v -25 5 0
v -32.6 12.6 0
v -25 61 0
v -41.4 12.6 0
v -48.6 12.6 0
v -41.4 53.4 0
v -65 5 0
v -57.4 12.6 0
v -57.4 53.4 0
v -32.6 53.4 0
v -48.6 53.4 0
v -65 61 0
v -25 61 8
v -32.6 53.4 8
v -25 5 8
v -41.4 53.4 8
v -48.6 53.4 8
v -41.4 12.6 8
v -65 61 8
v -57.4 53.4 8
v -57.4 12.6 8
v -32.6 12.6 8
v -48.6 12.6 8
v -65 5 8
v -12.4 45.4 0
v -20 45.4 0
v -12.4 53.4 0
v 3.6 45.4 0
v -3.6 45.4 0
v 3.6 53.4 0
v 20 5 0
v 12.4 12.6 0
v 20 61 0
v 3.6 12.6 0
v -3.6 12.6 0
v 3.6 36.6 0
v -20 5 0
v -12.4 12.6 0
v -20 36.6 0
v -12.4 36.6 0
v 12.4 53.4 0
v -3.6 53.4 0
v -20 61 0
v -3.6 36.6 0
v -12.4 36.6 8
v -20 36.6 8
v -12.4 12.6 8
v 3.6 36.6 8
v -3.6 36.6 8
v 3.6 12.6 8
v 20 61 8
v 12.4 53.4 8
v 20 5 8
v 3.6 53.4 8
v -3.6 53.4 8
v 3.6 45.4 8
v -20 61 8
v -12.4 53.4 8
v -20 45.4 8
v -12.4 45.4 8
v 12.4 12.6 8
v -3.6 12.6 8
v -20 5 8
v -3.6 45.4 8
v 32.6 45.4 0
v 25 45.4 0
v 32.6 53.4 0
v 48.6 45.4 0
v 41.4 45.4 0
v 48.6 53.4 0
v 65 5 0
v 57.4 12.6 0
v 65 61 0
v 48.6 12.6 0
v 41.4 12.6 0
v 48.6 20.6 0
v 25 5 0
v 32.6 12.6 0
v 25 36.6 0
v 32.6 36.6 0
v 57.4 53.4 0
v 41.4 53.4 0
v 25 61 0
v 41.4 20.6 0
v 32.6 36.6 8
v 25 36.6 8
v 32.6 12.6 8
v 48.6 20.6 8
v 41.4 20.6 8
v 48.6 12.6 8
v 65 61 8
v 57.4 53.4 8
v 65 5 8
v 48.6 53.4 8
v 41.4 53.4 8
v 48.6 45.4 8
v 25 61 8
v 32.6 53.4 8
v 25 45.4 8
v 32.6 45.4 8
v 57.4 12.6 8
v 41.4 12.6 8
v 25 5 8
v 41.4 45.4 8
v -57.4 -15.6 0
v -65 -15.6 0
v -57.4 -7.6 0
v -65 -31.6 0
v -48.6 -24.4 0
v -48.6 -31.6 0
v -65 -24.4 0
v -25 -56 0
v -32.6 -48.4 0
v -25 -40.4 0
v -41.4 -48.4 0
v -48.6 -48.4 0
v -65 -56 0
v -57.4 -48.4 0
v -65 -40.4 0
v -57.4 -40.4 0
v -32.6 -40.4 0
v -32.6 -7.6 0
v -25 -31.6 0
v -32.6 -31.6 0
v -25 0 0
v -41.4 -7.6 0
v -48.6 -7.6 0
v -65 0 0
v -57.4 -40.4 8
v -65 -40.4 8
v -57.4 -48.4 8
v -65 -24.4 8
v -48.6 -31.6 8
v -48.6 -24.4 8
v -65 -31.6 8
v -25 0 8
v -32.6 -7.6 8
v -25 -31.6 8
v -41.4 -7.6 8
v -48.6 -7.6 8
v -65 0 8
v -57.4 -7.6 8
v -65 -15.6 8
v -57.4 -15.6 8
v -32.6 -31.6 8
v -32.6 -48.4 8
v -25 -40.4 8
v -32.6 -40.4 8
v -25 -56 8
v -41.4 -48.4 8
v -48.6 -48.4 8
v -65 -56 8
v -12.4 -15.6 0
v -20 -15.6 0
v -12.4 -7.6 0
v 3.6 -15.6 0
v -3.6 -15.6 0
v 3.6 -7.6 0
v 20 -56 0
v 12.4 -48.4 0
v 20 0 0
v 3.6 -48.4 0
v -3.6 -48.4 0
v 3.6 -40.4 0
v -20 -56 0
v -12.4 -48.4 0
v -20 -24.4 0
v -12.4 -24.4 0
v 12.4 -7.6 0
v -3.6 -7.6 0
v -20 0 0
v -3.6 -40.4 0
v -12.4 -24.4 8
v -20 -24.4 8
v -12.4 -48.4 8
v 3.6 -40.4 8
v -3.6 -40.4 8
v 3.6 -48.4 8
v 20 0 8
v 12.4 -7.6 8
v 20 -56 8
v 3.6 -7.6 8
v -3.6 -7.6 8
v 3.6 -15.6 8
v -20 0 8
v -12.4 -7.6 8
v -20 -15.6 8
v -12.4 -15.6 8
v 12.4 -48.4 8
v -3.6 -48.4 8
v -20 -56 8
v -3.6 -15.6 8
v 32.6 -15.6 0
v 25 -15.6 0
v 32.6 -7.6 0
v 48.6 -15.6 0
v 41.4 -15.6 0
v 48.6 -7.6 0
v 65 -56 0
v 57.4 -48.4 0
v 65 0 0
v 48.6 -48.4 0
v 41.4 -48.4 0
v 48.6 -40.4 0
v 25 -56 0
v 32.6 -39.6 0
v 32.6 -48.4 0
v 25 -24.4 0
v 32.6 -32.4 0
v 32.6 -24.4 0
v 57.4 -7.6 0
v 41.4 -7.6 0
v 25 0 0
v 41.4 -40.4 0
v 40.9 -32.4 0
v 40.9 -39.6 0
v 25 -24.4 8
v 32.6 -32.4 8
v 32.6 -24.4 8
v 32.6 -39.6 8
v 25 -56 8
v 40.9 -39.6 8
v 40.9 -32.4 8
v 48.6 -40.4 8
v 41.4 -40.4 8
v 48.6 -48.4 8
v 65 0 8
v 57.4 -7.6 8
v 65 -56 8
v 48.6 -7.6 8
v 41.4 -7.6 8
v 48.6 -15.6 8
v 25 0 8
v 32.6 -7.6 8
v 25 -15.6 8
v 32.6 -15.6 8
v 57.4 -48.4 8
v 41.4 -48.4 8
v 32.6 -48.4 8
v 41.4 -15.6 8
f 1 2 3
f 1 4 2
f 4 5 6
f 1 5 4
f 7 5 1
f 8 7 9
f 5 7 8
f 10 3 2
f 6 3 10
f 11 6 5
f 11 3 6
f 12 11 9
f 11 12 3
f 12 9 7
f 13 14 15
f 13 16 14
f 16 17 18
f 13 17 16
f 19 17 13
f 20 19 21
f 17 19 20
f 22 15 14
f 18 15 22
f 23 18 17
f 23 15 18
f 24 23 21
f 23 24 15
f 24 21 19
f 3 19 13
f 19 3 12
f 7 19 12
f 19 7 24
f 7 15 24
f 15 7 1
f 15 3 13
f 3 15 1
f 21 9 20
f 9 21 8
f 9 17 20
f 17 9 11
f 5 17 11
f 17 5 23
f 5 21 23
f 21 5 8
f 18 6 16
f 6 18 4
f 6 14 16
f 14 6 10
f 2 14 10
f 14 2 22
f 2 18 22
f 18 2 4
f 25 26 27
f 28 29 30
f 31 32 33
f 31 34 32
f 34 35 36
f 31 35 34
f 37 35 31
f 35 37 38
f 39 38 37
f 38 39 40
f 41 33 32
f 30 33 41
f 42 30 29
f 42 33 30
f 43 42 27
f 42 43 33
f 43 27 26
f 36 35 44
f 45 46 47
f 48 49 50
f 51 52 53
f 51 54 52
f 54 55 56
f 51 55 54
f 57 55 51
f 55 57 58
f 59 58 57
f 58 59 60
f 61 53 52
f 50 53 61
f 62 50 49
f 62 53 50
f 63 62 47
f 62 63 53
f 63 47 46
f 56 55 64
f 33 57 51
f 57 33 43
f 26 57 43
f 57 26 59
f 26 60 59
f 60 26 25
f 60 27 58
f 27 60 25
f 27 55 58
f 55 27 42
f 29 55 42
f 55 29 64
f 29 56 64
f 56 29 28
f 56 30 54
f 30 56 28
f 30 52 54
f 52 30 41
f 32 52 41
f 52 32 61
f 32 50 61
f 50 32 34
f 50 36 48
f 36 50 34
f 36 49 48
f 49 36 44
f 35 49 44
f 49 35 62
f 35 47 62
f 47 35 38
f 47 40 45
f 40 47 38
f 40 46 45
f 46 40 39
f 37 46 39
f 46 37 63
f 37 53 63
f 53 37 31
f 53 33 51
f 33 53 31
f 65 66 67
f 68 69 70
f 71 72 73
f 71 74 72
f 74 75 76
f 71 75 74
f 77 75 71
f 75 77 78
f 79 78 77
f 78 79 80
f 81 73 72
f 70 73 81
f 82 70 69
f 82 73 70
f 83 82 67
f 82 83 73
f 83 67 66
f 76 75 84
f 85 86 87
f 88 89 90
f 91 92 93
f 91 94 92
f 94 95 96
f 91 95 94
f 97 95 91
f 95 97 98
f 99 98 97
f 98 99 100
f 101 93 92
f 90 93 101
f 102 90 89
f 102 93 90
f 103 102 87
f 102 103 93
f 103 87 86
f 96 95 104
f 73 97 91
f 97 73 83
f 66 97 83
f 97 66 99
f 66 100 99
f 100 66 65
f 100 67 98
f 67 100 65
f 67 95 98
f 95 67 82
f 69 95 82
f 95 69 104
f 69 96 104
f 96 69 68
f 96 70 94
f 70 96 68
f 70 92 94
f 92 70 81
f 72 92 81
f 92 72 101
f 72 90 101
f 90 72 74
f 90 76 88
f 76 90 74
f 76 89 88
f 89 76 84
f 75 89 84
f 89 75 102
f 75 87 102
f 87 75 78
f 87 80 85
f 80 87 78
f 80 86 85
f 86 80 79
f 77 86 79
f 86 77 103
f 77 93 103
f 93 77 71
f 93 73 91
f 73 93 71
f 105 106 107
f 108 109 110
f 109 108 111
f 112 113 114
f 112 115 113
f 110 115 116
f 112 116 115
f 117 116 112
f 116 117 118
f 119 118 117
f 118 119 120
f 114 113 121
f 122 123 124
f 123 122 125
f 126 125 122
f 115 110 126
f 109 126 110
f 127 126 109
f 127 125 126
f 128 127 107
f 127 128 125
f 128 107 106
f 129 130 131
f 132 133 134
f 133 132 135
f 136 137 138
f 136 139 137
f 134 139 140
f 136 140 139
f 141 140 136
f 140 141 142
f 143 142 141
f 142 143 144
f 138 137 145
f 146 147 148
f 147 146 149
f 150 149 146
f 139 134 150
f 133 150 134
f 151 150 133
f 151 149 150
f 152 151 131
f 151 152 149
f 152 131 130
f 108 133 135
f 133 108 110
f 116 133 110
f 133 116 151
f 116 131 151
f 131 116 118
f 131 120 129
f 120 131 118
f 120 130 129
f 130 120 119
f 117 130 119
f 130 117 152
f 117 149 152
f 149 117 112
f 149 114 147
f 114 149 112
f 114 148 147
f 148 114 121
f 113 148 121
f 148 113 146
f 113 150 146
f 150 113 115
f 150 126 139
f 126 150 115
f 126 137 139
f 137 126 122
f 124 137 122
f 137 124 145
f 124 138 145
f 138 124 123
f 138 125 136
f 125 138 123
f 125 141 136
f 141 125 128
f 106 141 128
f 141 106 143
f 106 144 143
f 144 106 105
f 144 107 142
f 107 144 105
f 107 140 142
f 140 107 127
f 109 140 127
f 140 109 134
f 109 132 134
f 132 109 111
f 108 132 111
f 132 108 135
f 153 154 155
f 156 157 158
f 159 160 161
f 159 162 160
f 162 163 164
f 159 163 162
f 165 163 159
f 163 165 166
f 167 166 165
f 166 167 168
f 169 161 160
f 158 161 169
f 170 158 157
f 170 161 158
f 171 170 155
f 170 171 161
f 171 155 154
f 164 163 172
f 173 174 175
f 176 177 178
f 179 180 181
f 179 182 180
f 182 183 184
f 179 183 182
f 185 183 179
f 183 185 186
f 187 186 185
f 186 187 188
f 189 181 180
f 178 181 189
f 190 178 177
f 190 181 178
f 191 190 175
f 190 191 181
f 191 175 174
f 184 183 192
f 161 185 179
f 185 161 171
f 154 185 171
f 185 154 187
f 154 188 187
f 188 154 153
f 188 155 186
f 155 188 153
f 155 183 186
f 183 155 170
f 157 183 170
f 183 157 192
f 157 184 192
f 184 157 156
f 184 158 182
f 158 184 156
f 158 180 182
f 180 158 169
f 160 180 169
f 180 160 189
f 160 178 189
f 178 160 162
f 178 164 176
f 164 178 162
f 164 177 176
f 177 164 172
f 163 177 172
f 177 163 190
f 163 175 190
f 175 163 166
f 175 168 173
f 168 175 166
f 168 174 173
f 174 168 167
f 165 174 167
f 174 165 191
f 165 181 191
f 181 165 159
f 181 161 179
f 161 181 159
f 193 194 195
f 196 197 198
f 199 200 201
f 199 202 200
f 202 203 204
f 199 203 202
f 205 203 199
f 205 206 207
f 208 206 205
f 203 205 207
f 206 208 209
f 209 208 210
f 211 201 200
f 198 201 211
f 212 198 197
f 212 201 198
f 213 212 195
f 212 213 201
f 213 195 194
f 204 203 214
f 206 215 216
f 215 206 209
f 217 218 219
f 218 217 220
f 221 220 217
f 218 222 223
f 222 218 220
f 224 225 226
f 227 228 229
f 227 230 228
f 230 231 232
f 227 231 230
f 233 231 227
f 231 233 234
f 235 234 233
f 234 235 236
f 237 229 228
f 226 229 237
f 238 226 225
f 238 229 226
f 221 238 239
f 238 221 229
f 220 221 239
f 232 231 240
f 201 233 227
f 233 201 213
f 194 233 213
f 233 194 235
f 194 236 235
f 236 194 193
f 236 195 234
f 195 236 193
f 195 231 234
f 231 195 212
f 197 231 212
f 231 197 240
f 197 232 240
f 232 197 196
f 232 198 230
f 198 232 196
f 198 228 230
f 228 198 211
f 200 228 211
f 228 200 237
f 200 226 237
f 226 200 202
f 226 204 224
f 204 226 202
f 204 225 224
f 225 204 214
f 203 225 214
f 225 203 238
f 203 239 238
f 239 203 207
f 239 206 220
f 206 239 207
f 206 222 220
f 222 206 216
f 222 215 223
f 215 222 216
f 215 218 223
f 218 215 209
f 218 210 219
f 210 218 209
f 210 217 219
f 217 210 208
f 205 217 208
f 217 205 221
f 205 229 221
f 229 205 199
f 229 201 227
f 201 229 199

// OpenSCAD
// "Gordian Knot" 3D puzzle.
// Len Trigg <lenbok@gmail.com>
// Modelled off the designs at: http://www.cs.tau.ac.il/~efif/applications/puzzles/knot/
// If you get stuck, see the animation at: http://www.youtube.com/watch?v=xNtNQRTdxps

// Size of one "unit" in mm.
basewidth = 8;  // [5:20]
// Tolerance between parts, in tenths of a mm.
tolerance = 4; // [0:40]

width=basewidth*5;
height=basewidth*7;
tolerance1 = tolerance/10;
tolerance2 = tolerance1*2;
echo("Each piece is ",width," by ",height);

module green2d() {
    difference() {
        square([width, height]);
        translate([basewidth-tolerance1, basewidth-tolerance1]) square([basewidth+tolerance2, basewidth*5+tolerance2]);
        translate([basewidth*3-tolerance1, basewidth-tolerance1]) square([basewidth+tolerance2, basewidth*5+tolerance2]);
    }
}
module yellow2d() {
    difference() {
        square([width, height]);
        translate([basewidth-tolerance1, basewidth-tolerance1]) square([basewidth+tolerance2, basewidth*5+tolerance2]);
        translate([basewidth*3-tolerance1, basewidth-tolerance1]) square([basewidth+tolerance2, basewidth*5+tolerance2]);
        translate([-0.1, basewidth*4-tolerance1]) square([basewidth*3+0.2, basewidth+tolerance2]);
    }
}
module opiece2d() {
    difference() {
        square([width, height]);
        translate([basewidth-tolerance1, basewidth-tolerance1]) square([basewidth+tolerance2, basewidth*5+tolerance2]);
        translate([basewidth*3-tolerance1, basewidth-tolerance1]) square([basewidth+tolerance2, basewidth*5+tolerance2]);
        translate([basewidth*2-0.1, basewidth*2-tolerance1]) square([basewidth+0.2, basewidth*3+tolerance2]);
        translate([-0.1, basewidth*4-tolerance1]) square([basewidth*3+0.2, basewidth+tolerance2]);
    }
}
module red2d() {
    difference() {
        square([width, height]);
        translate([basewidth-tolerance1, basewidth-tolerance1]) square([basewidth+tolerance2, basewidth*2+tolerance2]);
        translate([basewidth-tolerance1, basewidth*4-tolerance1]) square([basewidth+tolerance2, basewidth*2+tolerance2]);
        translate([basewidth*3-tolerance1, basewidth-tolerance1]) square([basewidth+tolerance2, basewidth*5+tolerance2]);
        translate([-0.1, basewidth*4-tolerance1]) square([basewidth+0.2, basewidth+tolerance2]);
        translate([-0.1, basewidth*2-tolerance1]) square([basewidth+0.2, basewidth+tolerance2]);
        translate([basewidth*3, basewidth*2-tolerance1]) square([basewidth*2+0.2, basewidth+tolerance2]);
    }
}
module blue2d() {
    difference() {
        square([width, height]);
        translate([basewidth-tolerance1, basewidth-tolerance1]) square([basewidth+tolerance2, basewidth+tolerance2]);
        translate([basewidth-tolerance1, basewidth*3-tolerance1]) square([basewidth+tolerance2, basewidth*3+tolerance2]);
        translate([basewidth*3-tolerance1, basewidth-tolerance1]) square([basewidth+tolerance2, basewidth*5+tolerance2]);
        translate([basewidth*2-0.1, basewidth*2-tolerance1]) square([basewidth+0.2, basewidth*3+tolerance2]);
        translate([-0.1, basewidth*4-tolerance1]) square([basewidth*3+0.2, basewidth+tolerance2]);
    }
}

module green() {
    color([0,1,0]) linear_extrude(height=basewidth) green2d();
}
module yellow() {
    color([1,1,0]) linear_extrude(height=basewidth) yellow2d();
}
module orange() {
    color([1,0.5,0]) linear_extrude(height=basewidth) opiece2d();
}
module purple() {
    color([1,0,1]) linear_extrude(height=basewidth) opiece2d();
}
module red() {
    color([1,0,0]) linear_extrude(height=basewidth) red2d();
}
module blue() {
    color([0,0,1]) linear_extrude(height=basewidth) blue2d();
}

module printall() {
    translate([-width*3/2-5, 5, 0]) green();
    translate([-width*1/2, 5, 0]) yellow();
    translate([width*1/2+5, 5, 0]) orange();
    translate([-width*3/2-5, -height, 0]) red();
    translate([-width*1/2, -height, 0]) purple();
    translate([width*1/2+5, -height, 0]) blue();
}

// Roughly how it should look when assembled, but the pieces may be in different orientations
module assembled() {
    translate([0, 0, basewidth*2]) {
        translate([0, 0, 0]) red();
        translate([0, 0, basewidth*2]) yellow();
    }
    translate([basewidth*1,basewidth,0]) rotate([90,0,90]) {
        translate([0, 0, 0]) purple();
        translate([0, 0, basewidth*2]) green();
    }
    translate([-basewidth,basewidth*5,basewidth*6]) rotate([-90,90,180]) {
        translate([0, 0, 0]) orange();
        translate([0, 0, basewidth*2]) blue();
    }
}
//assembled();
//translate([-width/2,-height/2,0]) blue();
printall();
